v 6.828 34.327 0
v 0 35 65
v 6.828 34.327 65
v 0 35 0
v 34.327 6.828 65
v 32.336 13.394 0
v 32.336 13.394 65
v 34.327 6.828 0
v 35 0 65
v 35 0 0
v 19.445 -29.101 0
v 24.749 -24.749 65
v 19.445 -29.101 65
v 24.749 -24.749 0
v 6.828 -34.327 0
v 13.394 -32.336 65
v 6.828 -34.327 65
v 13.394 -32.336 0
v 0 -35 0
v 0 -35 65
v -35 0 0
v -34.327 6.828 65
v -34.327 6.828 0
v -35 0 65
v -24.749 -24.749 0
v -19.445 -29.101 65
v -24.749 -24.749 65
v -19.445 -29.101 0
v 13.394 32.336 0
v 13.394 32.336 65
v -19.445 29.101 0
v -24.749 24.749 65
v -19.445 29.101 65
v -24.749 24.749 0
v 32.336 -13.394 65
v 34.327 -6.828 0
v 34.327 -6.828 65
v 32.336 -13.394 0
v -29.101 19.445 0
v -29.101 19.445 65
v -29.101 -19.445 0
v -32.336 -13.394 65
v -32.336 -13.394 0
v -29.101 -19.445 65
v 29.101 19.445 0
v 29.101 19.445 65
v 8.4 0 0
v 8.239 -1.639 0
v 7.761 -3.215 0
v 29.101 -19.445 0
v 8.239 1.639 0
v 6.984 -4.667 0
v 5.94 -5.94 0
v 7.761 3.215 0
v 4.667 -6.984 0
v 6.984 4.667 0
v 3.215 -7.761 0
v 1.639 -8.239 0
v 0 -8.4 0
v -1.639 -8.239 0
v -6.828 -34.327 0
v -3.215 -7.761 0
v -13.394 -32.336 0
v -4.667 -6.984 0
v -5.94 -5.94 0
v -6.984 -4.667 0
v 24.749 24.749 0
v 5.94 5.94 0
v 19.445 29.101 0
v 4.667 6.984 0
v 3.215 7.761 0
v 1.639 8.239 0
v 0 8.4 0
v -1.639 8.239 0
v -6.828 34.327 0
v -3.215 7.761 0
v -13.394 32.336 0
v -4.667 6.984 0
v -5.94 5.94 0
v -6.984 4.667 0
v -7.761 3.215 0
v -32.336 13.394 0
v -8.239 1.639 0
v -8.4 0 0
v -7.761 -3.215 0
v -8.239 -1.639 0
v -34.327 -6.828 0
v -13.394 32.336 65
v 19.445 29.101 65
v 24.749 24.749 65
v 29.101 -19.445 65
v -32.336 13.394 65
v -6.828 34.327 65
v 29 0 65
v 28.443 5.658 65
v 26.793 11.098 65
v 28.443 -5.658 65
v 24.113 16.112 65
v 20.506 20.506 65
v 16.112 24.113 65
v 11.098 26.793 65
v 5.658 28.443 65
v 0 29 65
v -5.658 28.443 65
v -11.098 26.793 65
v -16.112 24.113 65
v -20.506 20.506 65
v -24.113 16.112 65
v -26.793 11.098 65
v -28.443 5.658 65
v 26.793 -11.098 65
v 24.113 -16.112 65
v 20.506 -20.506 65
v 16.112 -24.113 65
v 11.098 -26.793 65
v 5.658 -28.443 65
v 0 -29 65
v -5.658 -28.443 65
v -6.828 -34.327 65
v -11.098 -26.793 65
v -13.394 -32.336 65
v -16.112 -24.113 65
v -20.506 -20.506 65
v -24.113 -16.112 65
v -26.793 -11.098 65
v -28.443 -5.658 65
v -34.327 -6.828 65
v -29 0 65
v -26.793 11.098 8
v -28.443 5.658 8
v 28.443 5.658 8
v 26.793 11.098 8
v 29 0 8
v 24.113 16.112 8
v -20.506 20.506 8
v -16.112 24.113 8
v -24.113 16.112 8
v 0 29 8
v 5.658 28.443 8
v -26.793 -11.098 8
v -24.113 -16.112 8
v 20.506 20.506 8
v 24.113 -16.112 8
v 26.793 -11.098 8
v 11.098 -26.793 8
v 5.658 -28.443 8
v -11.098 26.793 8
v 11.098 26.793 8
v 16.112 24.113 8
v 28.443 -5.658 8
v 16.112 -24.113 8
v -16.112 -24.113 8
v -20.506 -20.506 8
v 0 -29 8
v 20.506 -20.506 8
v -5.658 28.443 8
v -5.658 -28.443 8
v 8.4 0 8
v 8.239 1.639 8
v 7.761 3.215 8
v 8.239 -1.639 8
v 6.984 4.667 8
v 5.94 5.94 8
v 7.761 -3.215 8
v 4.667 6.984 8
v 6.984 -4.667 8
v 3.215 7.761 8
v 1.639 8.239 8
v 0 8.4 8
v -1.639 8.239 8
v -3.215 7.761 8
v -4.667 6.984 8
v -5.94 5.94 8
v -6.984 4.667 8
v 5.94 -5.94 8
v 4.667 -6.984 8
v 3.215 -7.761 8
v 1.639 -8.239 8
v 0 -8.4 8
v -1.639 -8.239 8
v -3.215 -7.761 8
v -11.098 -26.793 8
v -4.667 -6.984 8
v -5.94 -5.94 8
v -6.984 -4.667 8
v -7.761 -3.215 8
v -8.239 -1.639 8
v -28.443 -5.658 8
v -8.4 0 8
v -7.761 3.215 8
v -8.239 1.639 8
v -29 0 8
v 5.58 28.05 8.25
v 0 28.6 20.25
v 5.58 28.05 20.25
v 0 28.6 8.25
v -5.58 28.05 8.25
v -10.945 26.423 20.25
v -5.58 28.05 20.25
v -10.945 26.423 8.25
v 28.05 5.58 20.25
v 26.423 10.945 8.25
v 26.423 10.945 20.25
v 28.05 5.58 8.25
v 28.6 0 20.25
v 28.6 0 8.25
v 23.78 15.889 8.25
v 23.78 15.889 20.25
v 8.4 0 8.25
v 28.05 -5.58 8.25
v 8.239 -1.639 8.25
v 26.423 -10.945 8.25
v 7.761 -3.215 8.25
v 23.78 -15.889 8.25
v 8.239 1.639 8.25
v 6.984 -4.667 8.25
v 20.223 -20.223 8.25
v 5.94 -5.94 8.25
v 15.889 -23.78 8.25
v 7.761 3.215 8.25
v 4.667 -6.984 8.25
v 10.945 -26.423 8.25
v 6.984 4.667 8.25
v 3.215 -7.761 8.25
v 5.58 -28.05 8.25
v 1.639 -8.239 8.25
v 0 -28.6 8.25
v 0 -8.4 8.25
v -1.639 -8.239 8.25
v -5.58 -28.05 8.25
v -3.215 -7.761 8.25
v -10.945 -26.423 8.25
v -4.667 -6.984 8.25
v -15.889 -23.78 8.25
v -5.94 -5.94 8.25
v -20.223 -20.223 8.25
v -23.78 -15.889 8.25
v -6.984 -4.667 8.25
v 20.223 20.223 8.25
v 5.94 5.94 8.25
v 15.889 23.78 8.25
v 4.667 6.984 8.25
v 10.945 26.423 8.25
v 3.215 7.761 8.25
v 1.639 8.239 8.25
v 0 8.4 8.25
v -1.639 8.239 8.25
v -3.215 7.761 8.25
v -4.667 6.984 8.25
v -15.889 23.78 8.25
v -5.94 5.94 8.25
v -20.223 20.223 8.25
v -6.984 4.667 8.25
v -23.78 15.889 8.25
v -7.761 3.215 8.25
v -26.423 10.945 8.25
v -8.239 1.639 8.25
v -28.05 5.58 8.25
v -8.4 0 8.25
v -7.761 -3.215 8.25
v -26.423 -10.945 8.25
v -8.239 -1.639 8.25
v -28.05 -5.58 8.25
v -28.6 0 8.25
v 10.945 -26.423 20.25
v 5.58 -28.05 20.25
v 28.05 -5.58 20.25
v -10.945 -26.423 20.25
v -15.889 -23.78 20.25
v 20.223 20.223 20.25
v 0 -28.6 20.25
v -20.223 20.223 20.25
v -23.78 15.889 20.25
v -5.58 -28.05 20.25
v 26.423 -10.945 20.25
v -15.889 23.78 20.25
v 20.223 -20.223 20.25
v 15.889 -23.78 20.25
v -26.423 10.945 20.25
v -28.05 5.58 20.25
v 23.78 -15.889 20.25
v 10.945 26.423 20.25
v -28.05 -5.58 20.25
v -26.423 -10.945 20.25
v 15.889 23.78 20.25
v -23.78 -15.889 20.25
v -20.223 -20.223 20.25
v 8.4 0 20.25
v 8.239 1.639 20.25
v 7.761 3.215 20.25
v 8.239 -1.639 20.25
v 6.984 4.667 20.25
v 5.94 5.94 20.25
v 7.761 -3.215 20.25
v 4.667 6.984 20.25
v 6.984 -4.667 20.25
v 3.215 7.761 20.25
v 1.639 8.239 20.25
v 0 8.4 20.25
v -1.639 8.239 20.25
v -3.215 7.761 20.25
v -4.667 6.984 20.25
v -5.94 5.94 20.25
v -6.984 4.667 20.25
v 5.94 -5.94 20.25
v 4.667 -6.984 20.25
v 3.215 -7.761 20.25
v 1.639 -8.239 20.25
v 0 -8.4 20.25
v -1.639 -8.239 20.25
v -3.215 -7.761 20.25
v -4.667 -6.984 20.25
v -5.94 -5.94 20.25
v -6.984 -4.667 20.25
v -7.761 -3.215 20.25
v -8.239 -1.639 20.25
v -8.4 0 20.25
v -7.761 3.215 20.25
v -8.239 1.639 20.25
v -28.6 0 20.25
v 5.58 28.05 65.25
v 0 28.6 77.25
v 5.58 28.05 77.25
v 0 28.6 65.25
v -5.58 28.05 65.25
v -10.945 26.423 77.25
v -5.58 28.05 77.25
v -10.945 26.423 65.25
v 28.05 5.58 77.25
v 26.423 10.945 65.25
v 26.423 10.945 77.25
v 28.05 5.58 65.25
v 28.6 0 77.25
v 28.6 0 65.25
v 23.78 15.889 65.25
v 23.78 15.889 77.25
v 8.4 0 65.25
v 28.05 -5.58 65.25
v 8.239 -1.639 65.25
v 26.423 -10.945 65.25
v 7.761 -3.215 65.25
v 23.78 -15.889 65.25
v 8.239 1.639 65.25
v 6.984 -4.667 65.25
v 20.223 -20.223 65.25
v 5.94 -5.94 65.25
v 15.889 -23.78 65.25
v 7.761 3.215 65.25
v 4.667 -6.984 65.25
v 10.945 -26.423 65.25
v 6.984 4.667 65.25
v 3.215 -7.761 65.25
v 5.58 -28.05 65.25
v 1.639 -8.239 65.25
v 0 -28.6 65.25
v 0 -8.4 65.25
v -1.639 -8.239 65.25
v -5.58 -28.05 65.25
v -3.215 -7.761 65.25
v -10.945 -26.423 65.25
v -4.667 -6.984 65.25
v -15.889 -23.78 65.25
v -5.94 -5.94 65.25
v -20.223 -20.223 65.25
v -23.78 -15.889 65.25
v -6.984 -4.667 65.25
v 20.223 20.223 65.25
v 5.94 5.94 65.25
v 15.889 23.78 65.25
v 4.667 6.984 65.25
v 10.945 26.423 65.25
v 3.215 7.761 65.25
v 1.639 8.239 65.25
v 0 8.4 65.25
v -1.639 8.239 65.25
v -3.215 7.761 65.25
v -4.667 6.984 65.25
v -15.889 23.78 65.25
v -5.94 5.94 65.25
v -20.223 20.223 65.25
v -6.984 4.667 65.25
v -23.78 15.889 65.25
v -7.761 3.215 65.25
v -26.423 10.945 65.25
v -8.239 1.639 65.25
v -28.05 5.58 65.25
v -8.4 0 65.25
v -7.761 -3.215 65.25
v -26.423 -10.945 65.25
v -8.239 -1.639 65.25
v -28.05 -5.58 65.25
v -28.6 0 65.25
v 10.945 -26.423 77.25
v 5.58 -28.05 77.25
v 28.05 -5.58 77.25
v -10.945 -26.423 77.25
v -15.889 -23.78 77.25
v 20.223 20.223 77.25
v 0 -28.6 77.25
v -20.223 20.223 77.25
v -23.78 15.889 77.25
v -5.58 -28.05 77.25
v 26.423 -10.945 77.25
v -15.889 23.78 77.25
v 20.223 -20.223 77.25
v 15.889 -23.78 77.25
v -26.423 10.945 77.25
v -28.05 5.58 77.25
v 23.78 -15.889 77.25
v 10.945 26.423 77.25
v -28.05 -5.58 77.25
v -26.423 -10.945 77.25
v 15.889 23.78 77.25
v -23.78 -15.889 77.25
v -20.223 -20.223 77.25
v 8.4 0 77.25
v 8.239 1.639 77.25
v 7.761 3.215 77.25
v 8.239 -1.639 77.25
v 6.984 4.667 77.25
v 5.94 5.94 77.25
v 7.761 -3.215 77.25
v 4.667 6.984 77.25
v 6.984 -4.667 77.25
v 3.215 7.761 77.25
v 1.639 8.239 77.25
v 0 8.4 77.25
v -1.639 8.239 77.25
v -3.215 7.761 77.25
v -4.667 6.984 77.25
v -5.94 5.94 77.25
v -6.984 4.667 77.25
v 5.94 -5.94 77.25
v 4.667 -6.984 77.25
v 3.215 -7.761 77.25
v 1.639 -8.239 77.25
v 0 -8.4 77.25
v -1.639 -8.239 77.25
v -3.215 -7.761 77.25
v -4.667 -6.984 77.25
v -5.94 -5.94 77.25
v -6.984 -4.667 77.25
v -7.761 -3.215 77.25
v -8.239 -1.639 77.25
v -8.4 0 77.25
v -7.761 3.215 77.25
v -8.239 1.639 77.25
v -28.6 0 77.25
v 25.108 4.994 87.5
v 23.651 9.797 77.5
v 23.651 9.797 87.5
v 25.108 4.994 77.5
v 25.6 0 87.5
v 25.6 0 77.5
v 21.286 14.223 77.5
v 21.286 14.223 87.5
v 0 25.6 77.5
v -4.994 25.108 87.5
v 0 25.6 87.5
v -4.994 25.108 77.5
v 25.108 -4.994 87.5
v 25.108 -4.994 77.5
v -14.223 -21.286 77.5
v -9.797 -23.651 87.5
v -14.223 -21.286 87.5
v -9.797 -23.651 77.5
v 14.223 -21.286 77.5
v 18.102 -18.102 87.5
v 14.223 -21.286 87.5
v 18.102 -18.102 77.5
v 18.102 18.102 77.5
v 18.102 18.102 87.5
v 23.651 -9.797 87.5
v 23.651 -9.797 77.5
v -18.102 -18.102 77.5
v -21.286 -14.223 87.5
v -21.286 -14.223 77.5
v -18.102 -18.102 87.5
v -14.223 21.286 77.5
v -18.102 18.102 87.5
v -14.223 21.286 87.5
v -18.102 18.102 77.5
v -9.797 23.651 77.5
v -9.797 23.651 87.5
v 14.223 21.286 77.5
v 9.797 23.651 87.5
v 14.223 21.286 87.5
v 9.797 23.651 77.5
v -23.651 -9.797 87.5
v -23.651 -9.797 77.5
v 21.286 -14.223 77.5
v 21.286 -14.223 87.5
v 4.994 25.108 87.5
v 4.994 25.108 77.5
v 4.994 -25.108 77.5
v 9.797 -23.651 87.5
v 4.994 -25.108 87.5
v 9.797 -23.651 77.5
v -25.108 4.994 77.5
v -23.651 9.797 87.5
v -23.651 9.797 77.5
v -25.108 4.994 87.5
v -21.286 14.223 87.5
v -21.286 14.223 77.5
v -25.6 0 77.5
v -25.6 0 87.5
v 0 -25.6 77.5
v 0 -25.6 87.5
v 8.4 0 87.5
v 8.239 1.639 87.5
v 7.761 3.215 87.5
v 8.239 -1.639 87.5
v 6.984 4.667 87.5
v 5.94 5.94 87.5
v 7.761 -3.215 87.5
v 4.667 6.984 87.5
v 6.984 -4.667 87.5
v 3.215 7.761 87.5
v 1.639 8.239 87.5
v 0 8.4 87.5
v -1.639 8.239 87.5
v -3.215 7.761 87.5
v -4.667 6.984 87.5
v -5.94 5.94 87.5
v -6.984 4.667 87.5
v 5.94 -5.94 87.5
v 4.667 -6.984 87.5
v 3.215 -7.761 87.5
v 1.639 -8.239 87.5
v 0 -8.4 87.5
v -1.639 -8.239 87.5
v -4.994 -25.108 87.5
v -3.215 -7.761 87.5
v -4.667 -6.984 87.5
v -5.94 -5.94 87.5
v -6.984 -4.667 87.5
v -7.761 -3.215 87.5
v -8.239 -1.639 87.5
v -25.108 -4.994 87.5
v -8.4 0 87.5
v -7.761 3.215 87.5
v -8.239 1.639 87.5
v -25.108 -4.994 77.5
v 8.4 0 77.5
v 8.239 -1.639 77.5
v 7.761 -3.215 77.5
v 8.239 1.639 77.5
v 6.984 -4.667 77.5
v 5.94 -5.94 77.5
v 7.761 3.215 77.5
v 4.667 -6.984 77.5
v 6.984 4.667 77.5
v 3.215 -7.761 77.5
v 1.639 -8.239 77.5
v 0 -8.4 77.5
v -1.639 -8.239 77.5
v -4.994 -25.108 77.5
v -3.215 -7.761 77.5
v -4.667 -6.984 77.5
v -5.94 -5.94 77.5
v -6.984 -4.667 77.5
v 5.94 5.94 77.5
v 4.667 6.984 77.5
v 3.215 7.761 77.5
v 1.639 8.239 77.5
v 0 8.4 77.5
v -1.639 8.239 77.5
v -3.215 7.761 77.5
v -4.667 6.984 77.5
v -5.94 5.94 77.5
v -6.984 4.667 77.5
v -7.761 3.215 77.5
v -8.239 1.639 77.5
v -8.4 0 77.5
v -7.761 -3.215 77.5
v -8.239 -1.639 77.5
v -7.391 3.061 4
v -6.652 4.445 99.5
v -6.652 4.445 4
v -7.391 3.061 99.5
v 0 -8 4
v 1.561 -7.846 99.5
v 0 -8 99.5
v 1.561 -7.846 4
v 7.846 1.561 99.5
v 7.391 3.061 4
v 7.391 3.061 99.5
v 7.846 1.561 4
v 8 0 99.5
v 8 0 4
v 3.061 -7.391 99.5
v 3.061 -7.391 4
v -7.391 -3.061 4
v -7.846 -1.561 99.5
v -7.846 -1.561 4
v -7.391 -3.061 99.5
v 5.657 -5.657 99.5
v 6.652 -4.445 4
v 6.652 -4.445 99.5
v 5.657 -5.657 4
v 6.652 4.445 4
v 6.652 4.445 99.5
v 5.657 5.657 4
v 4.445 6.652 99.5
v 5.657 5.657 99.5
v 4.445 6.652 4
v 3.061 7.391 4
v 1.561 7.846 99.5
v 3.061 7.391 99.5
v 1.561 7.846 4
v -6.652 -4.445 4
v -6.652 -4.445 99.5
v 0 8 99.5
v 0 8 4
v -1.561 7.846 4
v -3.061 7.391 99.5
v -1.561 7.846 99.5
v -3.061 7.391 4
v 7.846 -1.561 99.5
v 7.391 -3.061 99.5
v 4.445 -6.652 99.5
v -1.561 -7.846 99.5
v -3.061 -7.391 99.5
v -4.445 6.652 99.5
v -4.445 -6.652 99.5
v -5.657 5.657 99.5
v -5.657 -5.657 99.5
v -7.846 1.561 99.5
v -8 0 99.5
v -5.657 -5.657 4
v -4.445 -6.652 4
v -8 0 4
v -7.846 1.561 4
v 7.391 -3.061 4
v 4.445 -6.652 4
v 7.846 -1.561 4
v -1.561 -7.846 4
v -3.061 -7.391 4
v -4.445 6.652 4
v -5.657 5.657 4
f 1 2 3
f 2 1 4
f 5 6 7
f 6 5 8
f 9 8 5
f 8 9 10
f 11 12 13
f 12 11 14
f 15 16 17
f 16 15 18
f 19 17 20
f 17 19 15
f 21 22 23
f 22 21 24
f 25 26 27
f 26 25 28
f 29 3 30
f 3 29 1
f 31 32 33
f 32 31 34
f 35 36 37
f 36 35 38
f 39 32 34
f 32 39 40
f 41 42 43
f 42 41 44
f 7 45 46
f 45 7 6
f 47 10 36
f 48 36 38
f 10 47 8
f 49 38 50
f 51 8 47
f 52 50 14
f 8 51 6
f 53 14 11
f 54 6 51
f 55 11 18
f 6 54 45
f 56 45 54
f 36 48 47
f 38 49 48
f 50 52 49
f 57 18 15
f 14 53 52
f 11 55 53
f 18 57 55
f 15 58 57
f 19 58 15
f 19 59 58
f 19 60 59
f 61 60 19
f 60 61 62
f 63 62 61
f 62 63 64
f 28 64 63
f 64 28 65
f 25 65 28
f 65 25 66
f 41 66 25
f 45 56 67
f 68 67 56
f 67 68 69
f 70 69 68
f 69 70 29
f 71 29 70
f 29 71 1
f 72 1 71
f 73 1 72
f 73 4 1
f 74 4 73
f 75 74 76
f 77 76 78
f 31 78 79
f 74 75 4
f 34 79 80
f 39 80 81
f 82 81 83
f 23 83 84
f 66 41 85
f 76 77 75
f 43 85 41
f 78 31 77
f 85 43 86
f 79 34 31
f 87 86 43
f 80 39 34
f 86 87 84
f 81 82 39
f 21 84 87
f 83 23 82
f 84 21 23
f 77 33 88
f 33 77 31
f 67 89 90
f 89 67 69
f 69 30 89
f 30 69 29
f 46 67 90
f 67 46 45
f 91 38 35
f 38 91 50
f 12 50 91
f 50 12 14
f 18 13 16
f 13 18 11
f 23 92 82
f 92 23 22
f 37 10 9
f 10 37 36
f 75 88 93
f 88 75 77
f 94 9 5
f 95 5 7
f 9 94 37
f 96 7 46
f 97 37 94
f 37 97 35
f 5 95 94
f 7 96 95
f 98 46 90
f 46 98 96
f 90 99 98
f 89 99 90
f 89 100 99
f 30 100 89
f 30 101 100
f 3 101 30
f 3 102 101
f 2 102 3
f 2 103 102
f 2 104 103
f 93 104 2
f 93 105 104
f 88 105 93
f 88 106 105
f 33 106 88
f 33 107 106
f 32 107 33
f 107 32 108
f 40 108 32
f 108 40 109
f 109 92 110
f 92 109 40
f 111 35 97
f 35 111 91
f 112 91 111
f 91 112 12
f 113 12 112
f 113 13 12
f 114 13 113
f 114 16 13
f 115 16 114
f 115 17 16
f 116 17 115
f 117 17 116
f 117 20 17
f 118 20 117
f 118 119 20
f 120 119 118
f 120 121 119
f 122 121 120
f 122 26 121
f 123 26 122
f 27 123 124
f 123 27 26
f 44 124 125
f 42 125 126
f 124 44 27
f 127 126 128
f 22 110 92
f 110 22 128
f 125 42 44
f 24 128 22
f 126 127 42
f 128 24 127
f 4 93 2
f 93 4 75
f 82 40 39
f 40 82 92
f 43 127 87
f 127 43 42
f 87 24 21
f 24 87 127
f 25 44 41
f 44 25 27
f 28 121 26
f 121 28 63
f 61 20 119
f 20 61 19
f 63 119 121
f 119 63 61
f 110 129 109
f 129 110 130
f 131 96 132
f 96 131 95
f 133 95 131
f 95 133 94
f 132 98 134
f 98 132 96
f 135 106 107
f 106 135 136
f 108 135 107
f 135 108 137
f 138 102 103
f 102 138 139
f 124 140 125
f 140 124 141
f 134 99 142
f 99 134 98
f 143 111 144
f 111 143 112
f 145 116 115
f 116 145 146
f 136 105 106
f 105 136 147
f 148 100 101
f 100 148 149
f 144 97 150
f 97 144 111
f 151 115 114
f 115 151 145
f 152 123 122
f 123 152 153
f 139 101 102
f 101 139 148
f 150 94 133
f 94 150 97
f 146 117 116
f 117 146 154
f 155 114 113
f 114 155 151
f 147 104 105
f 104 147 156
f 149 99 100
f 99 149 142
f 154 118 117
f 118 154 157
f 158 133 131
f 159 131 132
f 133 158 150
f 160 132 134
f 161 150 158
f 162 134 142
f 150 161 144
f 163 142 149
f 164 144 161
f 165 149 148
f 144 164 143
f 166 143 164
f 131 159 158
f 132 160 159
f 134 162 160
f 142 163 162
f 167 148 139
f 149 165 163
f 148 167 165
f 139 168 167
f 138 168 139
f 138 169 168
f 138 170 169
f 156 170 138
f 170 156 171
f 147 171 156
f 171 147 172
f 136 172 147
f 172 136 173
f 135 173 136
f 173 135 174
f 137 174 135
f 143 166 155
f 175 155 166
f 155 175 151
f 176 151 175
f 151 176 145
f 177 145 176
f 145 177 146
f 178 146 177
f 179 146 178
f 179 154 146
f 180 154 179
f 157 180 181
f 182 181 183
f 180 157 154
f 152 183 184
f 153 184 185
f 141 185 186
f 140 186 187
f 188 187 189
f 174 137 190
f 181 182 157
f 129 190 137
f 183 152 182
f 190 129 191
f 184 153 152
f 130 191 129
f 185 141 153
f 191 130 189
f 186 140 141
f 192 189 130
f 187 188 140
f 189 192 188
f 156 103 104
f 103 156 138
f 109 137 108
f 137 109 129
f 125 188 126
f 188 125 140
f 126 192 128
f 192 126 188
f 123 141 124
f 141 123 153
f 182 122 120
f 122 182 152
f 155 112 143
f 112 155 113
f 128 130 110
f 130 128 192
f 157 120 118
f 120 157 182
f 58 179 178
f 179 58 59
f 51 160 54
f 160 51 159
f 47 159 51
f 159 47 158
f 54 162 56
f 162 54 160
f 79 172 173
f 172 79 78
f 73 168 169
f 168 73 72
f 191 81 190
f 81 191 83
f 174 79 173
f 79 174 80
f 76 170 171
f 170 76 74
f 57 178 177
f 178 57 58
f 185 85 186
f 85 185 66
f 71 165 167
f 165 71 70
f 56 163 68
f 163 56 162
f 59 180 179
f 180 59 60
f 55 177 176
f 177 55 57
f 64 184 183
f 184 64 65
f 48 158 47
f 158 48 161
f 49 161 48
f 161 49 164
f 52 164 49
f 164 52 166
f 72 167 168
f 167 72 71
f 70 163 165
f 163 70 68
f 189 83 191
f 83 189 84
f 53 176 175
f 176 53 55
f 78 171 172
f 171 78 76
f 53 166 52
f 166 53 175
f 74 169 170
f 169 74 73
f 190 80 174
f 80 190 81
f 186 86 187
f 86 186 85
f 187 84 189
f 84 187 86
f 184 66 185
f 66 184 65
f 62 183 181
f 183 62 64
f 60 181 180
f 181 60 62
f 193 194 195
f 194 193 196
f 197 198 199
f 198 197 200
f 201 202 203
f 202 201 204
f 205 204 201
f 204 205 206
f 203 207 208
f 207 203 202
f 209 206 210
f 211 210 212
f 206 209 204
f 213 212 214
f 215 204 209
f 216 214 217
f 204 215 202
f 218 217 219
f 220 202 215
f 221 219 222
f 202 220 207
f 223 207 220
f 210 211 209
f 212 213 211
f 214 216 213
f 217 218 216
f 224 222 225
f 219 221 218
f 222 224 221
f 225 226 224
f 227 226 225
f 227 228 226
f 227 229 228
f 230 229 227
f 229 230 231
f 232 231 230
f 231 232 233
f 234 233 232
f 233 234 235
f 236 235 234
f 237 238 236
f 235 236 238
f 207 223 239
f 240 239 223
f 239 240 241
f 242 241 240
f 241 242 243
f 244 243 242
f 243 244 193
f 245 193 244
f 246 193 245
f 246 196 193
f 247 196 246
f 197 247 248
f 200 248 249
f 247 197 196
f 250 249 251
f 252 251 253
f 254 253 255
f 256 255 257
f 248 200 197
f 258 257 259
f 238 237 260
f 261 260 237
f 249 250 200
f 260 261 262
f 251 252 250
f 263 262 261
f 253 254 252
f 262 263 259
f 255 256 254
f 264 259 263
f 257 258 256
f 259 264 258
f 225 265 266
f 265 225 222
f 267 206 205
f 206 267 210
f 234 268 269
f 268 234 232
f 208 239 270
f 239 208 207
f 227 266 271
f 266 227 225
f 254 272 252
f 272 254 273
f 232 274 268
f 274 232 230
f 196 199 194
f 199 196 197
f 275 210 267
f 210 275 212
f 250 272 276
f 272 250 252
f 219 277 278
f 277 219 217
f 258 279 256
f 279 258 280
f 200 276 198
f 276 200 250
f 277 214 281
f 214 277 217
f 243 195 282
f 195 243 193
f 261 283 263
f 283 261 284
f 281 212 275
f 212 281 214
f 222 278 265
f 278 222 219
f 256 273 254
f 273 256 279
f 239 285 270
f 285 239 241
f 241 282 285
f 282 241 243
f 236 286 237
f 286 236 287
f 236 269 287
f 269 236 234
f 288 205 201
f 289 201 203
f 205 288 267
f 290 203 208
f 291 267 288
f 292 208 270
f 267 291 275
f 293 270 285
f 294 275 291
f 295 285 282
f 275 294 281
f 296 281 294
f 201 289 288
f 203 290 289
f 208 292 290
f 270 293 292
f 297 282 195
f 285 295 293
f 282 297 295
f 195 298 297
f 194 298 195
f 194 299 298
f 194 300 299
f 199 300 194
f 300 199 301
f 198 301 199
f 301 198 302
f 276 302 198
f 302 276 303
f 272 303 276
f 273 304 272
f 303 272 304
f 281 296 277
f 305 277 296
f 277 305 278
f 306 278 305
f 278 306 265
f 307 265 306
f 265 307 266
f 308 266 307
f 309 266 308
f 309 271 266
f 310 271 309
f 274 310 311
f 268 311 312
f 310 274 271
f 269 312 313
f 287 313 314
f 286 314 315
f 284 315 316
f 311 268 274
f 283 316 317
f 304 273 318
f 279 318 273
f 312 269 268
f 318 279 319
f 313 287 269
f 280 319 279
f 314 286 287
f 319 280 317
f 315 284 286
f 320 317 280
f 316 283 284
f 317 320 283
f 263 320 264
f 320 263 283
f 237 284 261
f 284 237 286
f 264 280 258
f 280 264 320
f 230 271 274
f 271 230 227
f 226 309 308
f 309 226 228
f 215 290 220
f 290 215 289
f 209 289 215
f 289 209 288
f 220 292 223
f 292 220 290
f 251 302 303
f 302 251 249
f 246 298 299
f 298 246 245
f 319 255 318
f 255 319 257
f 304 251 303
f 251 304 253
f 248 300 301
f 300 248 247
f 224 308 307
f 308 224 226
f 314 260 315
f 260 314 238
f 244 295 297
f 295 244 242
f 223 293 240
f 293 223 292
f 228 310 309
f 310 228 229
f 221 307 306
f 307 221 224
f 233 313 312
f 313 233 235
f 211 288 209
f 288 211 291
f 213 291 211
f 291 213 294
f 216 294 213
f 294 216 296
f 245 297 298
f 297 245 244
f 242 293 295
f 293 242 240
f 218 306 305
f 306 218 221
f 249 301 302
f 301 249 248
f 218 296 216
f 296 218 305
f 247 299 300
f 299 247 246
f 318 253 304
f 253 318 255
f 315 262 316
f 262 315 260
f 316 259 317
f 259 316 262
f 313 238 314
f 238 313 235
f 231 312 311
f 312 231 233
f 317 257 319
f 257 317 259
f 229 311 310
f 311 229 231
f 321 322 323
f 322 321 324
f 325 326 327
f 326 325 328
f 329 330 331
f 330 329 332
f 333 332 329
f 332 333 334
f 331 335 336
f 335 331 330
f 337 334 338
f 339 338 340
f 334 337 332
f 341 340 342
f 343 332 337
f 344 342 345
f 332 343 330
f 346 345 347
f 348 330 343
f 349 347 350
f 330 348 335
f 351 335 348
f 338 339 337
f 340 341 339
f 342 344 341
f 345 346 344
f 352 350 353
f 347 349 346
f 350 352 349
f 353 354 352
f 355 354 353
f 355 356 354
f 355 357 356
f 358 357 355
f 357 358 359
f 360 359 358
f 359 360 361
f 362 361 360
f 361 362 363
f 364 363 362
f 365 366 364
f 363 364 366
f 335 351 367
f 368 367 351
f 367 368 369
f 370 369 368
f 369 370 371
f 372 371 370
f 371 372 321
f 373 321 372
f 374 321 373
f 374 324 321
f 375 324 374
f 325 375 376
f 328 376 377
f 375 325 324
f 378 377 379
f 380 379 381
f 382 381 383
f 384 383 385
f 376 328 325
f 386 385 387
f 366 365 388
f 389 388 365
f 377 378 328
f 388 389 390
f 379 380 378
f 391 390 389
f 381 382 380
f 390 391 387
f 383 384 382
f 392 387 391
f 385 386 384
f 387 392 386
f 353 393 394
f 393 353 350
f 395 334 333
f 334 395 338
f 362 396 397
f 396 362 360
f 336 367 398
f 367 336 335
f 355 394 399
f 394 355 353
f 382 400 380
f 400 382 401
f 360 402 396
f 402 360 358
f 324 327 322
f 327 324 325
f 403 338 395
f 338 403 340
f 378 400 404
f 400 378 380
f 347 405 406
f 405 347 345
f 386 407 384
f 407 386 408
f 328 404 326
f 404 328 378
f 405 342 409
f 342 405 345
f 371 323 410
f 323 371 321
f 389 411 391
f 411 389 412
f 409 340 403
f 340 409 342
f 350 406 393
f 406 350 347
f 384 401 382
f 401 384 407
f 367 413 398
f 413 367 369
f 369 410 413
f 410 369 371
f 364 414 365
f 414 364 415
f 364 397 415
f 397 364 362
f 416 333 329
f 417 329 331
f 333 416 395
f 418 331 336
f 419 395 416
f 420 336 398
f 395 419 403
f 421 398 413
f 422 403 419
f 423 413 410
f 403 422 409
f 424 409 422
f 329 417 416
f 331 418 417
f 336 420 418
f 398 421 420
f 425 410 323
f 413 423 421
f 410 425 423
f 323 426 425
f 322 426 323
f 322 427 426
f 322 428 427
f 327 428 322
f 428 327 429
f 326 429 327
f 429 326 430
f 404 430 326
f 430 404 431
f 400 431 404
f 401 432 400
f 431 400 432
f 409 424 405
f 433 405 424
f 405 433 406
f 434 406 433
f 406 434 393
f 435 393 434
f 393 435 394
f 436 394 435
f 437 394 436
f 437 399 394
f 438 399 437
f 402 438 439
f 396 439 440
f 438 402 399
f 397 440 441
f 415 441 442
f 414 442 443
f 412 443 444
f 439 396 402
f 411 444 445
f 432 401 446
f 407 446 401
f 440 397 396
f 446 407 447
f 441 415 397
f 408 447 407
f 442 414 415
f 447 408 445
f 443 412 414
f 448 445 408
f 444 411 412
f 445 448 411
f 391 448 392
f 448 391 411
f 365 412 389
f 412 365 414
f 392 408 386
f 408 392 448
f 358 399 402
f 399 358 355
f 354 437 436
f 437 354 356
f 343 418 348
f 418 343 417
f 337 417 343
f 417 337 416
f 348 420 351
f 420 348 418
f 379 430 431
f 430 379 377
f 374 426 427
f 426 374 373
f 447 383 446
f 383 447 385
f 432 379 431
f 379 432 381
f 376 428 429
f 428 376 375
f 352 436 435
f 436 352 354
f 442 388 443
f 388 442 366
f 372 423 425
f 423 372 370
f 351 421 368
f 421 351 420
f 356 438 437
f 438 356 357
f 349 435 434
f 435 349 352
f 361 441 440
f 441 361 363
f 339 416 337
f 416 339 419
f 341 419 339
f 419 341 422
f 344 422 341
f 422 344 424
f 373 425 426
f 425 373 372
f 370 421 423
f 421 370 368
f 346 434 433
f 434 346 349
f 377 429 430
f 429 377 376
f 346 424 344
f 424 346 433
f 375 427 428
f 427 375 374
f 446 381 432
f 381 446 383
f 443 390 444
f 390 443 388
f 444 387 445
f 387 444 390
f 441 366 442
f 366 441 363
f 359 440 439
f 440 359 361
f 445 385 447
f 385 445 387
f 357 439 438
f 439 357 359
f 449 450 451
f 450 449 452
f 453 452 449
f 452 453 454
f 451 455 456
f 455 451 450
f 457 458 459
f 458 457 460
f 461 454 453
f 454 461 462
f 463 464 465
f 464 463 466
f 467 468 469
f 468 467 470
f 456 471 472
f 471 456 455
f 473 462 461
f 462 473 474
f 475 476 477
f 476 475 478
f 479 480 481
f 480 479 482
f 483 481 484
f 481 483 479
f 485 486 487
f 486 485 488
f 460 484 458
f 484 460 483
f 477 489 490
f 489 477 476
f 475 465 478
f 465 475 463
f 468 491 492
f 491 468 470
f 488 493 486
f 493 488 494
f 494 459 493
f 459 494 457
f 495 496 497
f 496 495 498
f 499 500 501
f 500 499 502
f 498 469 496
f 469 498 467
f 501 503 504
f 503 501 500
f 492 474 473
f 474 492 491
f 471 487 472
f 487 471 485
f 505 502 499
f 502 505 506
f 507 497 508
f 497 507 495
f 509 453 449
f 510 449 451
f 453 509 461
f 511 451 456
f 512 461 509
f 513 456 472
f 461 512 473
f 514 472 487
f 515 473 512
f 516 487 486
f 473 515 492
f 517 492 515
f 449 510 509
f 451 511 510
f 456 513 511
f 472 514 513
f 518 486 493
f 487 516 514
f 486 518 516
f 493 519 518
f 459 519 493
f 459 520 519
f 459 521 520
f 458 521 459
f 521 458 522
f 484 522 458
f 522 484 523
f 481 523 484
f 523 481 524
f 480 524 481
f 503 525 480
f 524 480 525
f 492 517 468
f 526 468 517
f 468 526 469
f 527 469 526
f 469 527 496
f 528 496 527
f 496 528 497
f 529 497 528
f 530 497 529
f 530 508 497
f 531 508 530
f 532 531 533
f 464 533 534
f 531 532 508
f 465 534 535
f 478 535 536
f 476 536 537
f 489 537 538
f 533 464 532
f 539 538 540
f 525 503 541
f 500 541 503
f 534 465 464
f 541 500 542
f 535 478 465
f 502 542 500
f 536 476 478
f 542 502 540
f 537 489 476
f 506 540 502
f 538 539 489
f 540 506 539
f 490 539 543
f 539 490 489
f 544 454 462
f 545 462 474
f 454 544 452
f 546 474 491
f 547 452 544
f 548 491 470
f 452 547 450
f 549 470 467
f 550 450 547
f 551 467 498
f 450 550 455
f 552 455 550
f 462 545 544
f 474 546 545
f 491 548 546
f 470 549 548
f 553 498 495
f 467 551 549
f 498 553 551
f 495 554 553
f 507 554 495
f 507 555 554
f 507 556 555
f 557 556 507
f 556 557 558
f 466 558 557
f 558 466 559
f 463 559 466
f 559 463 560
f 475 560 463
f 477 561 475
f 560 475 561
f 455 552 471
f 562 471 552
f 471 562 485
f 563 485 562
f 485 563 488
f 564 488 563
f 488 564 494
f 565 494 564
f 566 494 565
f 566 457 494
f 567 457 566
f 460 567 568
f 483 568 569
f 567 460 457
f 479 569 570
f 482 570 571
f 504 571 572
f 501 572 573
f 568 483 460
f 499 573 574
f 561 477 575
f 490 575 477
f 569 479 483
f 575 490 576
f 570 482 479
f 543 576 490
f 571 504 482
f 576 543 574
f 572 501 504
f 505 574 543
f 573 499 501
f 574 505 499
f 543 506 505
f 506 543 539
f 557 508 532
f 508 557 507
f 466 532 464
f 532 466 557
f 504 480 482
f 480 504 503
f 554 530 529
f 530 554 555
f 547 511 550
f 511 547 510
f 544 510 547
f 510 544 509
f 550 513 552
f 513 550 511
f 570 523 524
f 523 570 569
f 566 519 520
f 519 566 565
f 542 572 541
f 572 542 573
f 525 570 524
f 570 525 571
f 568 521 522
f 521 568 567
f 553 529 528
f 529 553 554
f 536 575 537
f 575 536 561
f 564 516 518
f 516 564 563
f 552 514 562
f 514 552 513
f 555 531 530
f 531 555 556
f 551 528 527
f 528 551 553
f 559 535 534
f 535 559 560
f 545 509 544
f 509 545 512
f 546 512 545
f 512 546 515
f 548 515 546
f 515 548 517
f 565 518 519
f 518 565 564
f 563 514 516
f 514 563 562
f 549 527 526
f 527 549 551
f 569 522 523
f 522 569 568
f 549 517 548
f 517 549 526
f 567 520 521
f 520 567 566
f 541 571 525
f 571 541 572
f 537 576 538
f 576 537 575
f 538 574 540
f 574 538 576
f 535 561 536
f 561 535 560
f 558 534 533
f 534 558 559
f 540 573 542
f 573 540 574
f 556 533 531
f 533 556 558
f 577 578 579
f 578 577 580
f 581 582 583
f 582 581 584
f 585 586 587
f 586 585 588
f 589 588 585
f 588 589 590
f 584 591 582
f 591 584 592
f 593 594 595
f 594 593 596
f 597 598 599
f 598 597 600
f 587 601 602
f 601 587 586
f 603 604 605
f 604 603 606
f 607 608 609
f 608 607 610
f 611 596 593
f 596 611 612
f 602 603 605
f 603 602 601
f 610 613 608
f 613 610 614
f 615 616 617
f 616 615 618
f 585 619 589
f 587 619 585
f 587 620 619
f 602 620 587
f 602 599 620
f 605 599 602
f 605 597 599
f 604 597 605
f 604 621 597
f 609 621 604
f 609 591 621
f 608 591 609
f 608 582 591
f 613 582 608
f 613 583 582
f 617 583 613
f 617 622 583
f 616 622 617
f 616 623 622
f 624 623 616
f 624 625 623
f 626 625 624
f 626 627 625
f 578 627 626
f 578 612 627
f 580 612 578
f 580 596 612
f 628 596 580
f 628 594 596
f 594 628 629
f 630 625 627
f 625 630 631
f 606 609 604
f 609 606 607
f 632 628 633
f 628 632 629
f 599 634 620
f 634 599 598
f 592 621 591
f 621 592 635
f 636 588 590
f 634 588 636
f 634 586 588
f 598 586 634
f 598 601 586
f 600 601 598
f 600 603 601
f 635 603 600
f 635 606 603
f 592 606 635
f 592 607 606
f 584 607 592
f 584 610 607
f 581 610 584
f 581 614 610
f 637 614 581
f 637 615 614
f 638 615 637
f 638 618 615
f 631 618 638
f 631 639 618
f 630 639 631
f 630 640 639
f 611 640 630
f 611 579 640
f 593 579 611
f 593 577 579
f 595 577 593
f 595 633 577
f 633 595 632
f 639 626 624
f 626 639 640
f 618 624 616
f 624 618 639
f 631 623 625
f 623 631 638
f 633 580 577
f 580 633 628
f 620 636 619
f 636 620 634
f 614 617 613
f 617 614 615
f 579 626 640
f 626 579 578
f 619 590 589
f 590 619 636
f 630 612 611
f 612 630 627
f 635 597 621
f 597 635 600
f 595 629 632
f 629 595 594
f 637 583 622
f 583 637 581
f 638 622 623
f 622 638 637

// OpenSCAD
$fn = 32;

// ------------------------------------------------------------------------
// Bearing housing: housing d70, two bearings and a shaft
// Every part is its own module, assembly() places them once.
// ------------------------------------------------------------------------

// --- part 1 ---
module housing() {
  difference() {
    cylinder(h = 65, d = 70);
    translate([0, 0, 8]) cylinder(h = 58, d = 58);
    translate([0, 0, -1]) cylinder(h = 10, d = 16.8);
  }
}

// --- part 2 ---
module bearing_lower() {
  difference() {
      translate([0, 0, 0]) cylinder(h = 12, d = 57.2);
      translate([0, 0, -1]) cylinder(h = 14, d = 16.8);
    }
}

// --- part 3 ---
module bearing_upper() {
  difference() {
      translate([0, 0, 0]) cylinder(h = 12, d = 57.2);
      translate([0, 0, -1]) cylinder(h = 14, d = 16.8);
    }
}

// --- part 4 ---
module spacer() {
  difference() {
      translate([0, 0, 0]) cylinder(h = 10, d = 51.2);
      translate([0, 0, -1]) cylinder(h = 12, d = 16.8);
    }
}

// --- part 5 ---
module shaft() {
  translate([0, 0, -47.75]) cylinder(h = 95.5, d = 16);
}

// --- assembly ---
module assembly() {
  translate([0, 0, 0]) rotate([0, 0, 0]) housing();
  translate([0, 0, 8.25]) rotate([0, 0, 0]) bearing_lower();
  translate([0, 0, 65.25]) rotate([0, 0, 0]) bearing_upper();
  translate([0, 0, 77.5]) rotate([0, 0, 0]) spacer();
  translate([0, 0, 51.75]) rotate([0, 0, 0]) shaft();
}

assembly();
